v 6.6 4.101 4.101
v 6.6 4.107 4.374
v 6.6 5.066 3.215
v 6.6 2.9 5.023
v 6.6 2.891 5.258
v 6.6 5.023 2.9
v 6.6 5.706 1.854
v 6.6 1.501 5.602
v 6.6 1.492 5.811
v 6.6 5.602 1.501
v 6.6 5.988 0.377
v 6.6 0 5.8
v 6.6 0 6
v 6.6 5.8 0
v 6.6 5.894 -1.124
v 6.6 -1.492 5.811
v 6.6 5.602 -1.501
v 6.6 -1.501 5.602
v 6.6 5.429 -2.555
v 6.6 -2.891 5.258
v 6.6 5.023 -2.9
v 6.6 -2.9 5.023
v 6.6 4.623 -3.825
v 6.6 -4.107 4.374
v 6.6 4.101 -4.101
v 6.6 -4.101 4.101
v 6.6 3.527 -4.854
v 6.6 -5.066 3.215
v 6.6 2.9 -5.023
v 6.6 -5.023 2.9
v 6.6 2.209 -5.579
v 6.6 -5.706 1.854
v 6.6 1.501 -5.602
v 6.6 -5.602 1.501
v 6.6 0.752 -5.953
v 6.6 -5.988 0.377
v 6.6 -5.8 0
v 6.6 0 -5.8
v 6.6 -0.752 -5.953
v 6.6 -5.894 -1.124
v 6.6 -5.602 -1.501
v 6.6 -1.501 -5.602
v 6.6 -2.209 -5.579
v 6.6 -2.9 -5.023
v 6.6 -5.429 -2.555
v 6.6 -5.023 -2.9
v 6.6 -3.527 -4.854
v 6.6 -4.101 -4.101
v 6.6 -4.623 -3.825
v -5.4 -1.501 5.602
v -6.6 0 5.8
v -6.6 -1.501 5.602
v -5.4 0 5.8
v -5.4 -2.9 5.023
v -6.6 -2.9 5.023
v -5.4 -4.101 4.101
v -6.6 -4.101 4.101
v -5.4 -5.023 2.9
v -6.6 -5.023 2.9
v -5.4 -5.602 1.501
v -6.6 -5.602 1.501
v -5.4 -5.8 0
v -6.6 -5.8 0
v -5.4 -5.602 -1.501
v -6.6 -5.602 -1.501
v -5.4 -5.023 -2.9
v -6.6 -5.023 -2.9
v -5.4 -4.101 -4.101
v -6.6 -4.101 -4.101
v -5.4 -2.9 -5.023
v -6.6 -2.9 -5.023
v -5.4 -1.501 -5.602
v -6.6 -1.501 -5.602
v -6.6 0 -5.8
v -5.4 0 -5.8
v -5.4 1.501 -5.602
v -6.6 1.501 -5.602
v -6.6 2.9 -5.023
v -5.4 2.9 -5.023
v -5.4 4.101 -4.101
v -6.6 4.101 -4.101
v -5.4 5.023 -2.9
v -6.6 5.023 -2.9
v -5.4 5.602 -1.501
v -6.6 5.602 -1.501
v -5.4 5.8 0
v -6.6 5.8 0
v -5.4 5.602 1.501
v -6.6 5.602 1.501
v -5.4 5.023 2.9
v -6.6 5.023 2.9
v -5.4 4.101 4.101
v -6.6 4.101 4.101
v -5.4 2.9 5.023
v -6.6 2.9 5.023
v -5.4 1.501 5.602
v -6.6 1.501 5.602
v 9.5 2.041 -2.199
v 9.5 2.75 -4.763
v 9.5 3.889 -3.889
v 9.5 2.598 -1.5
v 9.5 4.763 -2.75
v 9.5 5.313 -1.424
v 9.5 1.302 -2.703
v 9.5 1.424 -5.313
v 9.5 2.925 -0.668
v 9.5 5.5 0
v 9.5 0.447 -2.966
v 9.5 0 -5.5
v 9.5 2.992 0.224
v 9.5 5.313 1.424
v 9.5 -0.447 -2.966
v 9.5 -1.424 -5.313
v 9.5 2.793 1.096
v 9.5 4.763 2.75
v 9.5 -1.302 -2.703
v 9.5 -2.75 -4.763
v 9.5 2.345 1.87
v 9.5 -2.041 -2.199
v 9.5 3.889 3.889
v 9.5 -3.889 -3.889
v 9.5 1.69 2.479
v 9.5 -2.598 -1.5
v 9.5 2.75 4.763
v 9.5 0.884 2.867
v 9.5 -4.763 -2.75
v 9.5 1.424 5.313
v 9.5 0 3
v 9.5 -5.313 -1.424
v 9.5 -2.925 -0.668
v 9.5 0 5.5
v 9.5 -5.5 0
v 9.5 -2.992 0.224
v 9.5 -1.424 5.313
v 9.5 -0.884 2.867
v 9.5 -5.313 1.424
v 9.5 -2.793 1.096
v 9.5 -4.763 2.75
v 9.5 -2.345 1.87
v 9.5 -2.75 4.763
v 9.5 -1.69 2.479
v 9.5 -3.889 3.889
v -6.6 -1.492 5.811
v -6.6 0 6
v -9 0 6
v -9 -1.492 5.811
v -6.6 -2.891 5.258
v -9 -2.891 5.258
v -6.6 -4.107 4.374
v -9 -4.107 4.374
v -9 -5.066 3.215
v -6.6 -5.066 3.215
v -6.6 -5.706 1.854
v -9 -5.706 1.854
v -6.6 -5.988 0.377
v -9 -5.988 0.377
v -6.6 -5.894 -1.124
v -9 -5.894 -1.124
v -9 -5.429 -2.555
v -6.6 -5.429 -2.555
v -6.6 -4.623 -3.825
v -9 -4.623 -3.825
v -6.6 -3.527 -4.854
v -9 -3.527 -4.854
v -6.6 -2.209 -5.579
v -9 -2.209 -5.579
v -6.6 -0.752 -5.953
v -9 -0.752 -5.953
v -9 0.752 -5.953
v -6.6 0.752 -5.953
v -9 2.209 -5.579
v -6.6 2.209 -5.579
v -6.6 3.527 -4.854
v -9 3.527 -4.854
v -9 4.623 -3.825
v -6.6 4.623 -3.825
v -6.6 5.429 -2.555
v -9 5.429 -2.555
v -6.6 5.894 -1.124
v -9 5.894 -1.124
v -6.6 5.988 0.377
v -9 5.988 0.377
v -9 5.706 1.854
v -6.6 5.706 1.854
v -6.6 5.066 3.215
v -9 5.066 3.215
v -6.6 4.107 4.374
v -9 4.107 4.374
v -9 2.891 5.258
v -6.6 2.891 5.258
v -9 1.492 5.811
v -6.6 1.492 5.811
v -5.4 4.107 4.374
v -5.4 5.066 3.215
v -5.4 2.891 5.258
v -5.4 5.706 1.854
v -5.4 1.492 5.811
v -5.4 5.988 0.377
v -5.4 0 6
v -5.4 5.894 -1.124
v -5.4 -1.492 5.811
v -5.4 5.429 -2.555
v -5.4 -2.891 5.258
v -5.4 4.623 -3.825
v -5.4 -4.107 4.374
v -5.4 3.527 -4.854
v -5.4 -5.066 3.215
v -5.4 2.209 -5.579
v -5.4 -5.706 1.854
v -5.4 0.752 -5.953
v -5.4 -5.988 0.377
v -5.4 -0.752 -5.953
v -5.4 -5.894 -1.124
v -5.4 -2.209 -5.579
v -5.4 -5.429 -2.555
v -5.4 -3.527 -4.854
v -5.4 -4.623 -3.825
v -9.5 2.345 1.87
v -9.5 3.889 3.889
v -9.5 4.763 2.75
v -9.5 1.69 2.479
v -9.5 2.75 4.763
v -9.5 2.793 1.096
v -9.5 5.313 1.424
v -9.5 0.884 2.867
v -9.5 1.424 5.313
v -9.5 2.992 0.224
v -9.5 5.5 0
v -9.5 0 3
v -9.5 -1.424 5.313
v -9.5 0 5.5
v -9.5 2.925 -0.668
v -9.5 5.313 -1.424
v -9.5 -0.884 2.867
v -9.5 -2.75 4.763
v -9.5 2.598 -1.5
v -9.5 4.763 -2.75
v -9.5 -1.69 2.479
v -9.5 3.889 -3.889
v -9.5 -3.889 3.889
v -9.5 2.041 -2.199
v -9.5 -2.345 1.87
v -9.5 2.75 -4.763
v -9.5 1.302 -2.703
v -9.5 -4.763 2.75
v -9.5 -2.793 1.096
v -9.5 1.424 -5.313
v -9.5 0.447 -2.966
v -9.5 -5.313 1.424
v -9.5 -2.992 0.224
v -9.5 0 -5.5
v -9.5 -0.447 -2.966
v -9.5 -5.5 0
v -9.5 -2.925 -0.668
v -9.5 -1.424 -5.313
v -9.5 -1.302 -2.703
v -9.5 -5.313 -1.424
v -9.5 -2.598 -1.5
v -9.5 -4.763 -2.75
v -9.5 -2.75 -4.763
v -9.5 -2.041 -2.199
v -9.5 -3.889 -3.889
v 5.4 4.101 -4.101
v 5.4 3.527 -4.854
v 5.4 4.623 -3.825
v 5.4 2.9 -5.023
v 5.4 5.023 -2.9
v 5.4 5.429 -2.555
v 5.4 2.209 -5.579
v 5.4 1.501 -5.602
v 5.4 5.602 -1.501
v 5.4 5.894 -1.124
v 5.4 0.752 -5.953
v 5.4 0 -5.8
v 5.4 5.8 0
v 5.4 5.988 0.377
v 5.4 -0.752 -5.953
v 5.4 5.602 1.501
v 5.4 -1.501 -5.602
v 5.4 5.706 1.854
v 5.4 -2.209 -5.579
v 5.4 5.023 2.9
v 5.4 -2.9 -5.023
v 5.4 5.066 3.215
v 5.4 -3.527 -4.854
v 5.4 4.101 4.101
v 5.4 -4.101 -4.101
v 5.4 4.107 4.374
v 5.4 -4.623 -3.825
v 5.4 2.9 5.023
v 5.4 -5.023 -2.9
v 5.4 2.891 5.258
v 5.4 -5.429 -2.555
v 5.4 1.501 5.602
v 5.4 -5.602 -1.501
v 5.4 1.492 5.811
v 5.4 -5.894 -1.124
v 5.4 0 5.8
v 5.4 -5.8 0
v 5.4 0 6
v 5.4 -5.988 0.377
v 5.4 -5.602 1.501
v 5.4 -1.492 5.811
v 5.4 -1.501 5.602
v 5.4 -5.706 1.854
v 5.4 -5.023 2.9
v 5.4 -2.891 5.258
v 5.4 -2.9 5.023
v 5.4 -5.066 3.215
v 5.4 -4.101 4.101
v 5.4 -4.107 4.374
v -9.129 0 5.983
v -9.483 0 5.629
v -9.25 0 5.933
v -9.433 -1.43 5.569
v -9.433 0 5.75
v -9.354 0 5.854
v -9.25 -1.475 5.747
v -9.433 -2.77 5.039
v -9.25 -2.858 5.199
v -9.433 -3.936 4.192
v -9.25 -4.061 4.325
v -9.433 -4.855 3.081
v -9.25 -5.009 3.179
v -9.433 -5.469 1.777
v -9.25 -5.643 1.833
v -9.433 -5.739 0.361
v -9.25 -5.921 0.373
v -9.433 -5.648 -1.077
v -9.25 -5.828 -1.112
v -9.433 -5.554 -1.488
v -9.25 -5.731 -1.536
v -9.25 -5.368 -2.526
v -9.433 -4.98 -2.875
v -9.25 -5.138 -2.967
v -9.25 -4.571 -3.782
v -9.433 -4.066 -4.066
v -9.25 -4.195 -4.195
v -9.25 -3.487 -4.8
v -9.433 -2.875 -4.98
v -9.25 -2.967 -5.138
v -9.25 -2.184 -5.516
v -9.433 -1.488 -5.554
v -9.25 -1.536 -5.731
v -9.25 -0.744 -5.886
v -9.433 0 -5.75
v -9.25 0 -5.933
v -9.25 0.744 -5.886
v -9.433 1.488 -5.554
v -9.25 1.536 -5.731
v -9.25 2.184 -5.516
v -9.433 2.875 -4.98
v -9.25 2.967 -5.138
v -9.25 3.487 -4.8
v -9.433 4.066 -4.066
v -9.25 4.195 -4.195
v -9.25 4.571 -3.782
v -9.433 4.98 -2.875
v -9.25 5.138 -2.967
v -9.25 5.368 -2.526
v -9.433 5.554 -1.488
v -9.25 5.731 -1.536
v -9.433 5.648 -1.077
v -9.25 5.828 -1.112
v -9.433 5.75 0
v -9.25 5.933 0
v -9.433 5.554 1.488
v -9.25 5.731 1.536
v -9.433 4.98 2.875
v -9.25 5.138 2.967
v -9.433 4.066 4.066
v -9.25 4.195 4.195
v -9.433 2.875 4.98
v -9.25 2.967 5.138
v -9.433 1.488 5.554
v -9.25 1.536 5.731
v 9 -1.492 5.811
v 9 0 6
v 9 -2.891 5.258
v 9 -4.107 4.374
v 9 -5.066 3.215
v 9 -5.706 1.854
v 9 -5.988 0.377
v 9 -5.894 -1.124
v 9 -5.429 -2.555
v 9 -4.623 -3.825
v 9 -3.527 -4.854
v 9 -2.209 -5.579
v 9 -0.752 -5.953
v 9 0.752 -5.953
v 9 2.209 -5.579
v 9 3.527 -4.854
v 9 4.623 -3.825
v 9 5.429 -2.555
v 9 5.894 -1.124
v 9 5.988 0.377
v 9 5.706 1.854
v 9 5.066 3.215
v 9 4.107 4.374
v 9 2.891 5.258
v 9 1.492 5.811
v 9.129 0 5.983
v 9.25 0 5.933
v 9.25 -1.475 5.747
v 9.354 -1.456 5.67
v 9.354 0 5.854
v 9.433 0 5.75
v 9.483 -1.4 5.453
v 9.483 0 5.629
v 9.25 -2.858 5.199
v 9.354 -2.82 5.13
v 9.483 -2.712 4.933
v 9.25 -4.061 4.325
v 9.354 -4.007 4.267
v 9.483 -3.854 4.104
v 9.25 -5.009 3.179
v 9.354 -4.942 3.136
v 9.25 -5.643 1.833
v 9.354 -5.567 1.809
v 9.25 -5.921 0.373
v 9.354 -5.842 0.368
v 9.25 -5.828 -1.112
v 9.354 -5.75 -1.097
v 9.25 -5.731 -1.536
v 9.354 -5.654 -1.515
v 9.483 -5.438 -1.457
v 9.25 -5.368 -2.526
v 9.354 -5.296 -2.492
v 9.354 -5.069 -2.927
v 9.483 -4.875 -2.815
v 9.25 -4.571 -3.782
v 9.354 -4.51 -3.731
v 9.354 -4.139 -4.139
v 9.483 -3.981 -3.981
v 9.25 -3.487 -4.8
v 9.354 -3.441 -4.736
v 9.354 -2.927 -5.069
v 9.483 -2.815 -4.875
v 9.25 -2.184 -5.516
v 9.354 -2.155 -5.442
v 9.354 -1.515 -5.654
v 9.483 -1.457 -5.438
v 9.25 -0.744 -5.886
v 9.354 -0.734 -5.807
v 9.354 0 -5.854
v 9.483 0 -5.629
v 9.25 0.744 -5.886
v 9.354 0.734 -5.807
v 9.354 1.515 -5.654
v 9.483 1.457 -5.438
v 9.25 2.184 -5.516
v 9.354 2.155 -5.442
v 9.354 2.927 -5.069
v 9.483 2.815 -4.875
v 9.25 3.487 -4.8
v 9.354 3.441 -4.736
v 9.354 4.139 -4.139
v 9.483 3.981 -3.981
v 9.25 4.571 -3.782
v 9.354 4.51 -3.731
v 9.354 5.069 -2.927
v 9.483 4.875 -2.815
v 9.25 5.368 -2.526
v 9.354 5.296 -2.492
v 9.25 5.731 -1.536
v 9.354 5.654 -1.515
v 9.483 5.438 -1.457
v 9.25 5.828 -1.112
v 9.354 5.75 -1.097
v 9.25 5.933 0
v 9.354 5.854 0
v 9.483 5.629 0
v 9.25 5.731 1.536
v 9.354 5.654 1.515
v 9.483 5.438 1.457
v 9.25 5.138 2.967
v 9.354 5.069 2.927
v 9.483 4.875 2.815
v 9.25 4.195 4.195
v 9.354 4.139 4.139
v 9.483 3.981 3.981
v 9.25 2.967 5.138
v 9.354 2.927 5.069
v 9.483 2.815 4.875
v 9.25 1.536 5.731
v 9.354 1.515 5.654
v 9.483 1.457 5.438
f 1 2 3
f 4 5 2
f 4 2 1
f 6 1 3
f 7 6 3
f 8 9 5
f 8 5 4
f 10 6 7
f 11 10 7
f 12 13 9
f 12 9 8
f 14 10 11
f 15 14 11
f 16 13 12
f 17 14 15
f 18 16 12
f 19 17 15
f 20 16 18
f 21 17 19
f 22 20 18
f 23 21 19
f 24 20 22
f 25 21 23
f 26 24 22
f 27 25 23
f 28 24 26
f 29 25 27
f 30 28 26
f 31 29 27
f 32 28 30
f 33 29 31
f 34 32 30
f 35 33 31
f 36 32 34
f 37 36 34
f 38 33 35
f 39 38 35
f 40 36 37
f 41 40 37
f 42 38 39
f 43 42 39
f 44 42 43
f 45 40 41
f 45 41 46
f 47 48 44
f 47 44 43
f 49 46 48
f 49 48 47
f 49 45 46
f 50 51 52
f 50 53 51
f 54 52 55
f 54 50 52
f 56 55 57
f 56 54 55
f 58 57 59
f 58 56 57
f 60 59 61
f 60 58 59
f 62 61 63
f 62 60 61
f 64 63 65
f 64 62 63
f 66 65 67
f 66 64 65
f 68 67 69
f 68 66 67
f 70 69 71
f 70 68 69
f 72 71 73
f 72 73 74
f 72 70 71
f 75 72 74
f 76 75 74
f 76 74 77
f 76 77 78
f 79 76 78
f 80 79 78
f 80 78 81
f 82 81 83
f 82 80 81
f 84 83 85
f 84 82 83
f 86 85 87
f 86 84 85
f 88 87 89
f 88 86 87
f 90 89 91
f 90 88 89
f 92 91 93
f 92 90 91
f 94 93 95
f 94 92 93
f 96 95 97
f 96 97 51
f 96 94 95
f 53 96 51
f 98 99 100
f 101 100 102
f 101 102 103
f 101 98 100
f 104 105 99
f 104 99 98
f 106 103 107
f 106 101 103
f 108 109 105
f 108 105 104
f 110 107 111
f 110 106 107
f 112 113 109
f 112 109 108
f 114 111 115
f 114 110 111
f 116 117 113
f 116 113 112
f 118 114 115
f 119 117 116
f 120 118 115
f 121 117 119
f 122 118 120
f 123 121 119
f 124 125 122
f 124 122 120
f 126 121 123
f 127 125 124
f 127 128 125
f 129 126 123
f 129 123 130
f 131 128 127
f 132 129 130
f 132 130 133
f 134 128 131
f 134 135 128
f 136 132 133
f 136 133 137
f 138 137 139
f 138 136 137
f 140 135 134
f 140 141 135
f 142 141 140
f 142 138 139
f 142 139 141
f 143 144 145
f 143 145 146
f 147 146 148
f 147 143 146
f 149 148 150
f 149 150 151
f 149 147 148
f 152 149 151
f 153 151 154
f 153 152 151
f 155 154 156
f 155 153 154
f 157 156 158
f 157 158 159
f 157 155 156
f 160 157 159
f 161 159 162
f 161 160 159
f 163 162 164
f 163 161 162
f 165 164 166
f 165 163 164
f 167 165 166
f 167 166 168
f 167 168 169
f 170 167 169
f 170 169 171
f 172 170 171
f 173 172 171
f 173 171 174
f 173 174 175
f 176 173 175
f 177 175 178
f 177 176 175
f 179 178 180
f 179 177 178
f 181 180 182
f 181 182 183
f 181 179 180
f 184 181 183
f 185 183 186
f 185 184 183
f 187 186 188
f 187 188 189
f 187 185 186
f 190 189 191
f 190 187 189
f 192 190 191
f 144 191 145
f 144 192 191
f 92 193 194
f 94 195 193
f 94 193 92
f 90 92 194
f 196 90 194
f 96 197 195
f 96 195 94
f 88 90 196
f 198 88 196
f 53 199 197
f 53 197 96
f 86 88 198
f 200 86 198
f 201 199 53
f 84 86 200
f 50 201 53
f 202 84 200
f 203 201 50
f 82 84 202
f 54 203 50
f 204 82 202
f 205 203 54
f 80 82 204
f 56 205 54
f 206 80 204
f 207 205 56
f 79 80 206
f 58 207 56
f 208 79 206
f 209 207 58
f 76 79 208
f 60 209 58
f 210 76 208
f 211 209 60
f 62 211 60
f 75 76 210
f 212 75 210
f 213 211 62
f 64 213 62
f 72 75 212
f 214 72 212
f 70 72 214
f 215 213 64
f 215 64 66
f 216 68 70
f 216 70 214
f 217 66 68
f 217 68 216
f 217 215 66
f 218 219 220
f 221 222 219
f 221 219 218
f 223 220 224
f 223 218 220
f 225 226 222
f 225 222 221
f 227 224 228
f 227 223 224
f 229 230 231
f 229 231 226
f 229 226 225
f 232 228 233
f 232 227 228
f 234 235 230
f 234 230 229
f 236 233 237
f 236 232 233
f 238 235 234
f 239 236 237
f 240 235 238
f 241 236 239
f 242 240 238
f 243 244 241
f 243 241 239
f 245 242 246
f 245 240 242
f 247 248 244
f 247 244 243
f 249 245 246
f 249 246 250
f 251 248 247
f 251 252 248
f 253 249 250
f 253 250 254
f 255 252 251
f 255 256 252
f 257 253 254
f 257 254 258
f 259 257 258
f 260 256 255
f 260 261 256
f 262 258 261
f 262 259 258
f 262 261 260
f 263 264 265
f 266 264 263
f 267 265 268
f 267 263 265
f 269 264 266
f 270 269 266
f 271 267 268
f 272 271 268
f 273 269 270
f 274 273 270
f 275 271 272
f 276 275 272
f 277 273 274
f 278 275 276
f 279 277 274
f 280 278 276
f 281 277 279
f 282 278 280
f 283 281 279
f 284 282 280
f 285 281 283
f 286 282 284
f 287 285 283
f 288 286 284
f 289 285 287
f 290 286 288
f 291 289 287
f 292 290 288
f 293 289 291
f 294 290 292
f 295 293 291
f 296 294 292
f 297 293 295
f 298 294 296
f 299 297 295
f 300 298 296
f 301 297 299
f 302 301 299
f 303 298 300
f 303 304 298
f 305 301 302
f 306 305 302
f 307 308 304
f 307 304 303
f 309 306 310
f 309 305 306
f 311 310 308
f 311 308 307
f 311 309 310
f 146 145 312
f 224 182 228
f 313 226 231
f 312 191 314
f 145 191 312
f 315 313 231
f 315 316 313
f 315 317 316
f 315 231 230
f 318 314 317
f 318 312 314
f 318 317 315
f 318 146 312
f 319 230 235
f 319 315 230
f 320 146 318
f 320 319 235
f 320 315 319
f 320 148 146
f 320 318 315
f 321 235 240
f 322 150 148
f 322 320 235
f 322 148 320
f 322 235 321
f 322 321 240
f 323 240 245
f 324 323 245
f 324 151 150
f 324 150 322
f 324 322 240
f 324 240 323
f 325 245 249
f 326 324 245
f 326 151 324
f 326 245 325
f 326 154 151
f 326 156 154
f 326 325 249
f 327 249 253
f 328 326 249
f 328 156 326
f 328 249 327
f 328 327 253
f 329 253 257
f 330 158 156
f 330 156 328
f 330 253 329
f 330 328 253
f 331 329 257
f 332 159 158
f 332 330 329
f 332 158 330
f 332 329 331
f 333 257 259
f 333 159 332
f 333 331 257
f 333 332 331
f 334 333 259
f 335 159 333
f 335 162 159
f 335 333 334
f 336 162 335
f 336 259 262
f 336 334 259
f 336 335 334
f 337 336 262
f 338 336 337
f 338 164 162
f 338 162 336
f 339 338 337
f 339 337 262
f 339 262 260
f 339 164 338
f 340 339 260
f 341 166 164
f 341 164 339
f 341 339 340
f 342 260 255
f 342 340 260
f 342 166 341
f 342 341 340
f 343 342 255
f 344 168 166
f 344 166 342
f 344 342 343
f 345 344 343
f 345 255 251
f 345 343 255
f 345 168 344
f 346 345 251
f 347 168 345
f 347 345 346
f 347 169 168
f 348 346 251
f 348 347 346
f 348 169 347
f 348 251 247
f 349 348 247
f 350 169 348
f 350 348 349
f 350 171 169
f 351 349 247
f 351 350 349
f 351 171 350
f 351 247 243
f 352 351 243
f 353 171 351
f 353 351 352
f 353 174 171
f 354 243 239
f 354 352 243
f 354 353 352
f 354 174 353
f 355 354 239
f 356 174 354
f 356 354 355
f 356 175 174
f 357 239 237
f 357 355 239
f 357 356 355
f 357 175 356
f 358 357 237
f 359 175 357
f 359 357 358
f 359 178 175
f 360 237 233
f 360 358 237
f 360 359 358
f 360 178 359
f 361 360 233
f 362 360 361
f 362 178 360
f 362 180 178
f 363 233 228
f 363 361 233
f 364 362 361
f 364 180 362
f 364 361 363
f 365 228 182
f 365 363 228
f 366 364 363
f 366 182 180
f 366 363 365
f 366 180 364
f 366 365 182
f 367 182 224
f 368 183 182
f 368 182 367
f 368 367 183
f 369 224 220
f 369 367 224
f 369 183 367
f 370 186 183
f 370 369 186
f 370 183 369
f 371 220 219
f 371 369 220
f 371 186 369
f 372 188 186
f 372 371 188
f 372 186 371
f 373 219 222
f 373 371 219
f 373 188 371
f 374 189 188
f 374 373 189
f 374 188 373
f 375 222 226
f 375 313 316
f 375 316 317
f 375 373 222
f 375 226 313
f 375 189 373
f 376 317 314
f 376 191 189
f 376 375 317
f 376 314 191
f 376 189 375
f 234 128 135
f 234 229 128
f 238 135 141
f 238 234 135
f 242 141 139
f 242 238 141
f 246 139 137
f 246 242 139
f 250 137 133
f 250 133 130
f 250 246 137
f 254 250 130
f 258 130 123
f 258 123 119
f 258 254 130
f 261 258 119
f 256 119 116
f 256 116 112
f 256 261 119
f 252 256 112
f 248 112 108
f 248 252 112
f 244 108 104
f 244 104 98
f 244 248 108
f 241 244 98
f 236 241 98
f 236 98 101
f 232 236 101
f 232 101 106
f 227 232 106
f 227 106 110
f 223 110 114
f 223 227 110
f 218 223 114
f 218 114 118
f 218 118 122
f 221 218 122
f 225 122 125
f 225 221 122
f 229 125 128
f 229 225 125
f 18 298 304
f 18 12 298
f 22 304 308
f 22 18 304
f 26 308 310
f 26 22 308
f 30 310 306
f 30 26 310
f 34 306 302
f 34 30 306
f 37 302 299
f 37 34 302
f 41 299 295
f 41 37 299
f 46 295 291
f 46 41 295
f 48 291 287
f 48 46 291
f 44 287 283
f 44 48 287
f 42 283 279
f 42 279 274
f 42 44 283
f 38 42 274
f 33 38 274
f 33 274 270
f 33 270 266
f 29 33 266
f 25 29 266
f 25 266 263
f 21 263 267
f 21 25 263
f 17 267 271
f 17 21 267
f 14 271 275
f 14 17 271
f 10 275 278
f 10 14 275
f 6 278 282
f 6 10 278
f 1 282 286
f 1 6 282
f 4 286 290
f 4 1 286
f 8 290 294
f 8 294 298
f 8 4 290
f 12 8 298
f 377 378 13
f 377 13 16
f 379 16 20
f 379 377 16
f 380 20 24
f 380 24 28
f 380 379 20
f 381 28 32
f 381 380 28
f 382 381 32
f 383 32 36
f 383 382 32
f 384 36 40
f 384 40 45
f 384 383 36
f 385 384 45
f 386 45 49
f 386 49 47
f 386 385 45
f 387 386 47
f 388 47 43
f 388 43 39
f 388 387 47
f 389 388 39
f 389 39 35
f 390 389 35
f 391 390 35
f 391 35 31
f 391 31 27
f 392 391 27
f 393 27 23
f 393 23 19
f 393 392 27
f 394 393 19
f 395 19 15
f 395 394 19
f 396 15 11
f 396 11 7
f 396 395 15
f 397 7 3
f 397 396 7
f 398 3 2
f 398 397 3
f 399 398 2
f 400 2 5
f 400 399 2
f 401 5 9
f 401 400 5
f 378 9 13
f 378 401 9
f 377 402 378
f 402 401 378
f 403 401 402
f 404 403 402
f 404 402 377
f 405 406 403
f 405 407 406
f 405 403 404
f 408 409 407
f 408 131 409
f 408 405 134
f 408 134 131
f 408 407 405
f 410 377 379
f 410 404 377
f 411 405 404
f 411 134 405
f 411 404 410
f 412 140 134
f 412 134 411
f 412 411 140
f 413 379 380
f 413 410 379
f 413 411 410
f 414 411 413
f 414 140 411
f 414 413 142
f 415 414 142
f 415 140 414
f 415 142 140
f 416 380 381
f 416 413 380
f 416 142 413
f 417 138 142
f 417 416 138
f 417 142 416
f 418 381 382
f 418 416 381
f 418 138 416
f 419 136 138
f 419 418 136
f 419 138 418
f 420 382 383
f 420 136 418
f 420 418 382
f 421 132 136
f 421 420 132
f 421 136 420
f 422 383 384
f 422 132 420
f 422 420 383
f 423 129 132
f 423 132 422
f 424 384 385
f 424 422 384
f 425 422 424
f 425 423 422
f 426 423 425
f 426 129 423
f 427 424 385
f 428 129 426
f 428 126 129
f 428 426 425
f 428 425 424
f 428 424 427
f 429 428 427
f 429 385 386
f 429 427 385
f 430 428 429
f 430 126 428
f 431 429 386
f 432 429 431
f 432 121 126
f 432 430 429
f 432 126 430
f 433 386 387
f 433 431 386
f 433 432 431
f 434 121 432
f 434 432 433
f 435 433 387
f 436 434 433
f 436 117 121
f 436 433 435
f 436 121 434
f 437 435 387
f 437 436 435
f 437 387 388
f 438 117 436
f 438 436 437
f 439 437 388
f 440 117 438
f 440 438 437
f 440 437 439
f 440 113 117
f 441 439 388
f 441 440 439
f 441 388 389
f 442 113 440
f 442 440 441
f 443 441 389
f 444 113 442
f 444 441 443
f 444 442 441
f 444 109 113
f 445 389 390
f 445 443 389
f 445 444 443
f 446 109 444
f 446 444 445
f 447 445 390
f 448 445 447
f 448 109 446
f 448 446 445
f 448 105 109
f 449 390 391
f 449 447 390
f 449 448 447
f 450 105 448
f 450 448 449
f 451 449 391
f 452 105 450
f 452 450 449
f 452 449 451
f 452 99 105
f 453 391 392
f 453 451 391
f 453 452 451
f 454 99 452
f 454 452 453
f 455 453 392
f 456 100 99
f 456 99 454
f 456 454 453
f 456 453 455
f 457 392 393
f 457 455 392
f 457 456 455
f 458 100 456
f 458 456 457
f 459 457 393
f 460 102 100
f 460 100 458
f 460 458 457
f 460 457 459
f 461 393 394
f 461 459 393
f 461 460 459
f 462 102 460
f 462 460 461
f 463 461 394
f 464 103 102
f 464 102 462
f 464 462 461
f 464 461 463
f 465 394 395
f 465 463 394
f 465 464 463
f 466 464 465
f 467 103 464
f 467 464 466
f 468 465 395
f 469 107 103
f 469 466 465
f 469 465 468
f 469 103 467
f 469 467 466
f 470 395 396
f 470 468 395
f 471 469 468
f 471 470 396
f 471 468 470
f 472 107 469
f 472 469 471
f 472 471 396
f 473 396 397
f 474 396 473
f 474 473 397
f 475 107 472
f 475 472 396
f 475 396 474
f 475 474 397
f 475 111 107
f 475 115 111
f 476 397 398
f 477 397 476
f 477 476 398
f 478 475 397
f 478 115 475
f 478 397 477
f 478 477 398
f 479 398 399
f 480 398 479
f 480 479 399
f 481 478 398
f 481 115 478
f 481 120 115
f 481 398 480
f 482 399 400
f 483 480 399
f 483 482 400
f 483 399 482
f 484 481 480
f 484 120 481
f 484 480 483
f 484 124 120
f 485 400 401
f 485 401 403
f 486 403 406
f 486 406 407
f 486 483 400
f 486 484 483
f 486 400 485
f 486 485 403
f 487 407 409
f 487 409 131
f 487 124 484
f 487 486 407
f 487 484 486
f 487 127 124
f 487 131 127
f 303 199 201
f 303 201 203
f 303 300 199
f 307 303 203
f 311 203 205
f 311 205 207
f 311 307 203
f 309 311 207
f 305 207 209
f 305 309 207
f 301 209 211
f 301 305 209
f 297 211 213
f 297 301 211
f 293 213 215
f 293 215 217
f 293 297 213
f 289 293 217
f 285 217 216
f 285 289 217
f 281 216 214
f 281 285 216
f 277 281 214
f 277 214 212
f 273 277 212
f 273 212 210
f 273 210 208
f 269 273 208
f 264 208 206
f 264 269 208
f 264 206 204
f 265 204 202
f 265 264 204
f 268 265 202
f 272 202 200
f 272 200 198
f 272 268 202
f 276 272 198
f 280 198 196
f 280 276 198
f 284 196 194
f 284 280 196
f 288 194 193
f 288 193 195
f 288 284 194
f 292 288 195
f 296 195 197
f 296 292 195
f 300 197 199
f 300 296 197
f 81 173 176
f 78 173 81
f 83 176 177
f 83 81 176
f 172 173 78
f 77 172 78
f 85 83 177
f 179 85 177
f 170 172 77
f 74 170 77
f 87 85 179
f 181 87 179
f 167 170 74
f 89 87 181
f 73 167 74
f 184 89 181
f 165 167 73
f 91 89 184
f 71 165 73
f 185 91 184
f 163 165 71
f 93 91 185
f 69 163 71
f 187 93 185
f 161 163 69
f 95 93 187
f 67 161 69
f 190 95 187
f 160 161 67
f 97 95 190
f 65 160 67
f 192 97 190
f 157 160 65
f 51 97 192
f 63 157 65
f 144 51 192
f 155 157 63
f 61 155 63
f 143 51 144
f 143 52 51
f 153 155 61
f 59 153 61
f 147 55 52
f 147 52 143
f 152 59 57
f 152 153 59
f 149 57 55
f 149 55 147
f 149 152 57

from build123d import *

# Parameters (mm, degrees)
FILLET1_R = 0.5


with BuildPart() as part:
    # Sketch2 → Revolve1 (revolve)
    with BuildSketch(Plane(origin=(0, 0, 0), x_dir=(1, 0, 0), z_dir=(0, 1, 0)), mode=Mode.PRIVATE) as revolve1_sk:
        Polygon((-5.4, 6), (5.4, 6), (5.4, 5.8), (6.6, 5.8), (6.6, 6), (9.5, 6), (9.5, 3), (-9.5, 3), (-9.5, 6), (-6.6, 6), (-6.6, 5.8), (-5.4, 5.8), align=None)
    revolve(revolve1_sk.sketch.rotate(Axis((0, 0, 0), (1, 0, 0)), 180), axis=Axis((0, 0, 0), (1, 0, 0)))

    # Fillet1
    fillet1_edges = [part.edges().sort_by_distance(p)[0] for p in [
        (-9.5, 0, -6),
        (9.5, 0, -6),
    ]]
    fillet(fillet1_edges, radius=FILLET1_R)


solid = part.part
